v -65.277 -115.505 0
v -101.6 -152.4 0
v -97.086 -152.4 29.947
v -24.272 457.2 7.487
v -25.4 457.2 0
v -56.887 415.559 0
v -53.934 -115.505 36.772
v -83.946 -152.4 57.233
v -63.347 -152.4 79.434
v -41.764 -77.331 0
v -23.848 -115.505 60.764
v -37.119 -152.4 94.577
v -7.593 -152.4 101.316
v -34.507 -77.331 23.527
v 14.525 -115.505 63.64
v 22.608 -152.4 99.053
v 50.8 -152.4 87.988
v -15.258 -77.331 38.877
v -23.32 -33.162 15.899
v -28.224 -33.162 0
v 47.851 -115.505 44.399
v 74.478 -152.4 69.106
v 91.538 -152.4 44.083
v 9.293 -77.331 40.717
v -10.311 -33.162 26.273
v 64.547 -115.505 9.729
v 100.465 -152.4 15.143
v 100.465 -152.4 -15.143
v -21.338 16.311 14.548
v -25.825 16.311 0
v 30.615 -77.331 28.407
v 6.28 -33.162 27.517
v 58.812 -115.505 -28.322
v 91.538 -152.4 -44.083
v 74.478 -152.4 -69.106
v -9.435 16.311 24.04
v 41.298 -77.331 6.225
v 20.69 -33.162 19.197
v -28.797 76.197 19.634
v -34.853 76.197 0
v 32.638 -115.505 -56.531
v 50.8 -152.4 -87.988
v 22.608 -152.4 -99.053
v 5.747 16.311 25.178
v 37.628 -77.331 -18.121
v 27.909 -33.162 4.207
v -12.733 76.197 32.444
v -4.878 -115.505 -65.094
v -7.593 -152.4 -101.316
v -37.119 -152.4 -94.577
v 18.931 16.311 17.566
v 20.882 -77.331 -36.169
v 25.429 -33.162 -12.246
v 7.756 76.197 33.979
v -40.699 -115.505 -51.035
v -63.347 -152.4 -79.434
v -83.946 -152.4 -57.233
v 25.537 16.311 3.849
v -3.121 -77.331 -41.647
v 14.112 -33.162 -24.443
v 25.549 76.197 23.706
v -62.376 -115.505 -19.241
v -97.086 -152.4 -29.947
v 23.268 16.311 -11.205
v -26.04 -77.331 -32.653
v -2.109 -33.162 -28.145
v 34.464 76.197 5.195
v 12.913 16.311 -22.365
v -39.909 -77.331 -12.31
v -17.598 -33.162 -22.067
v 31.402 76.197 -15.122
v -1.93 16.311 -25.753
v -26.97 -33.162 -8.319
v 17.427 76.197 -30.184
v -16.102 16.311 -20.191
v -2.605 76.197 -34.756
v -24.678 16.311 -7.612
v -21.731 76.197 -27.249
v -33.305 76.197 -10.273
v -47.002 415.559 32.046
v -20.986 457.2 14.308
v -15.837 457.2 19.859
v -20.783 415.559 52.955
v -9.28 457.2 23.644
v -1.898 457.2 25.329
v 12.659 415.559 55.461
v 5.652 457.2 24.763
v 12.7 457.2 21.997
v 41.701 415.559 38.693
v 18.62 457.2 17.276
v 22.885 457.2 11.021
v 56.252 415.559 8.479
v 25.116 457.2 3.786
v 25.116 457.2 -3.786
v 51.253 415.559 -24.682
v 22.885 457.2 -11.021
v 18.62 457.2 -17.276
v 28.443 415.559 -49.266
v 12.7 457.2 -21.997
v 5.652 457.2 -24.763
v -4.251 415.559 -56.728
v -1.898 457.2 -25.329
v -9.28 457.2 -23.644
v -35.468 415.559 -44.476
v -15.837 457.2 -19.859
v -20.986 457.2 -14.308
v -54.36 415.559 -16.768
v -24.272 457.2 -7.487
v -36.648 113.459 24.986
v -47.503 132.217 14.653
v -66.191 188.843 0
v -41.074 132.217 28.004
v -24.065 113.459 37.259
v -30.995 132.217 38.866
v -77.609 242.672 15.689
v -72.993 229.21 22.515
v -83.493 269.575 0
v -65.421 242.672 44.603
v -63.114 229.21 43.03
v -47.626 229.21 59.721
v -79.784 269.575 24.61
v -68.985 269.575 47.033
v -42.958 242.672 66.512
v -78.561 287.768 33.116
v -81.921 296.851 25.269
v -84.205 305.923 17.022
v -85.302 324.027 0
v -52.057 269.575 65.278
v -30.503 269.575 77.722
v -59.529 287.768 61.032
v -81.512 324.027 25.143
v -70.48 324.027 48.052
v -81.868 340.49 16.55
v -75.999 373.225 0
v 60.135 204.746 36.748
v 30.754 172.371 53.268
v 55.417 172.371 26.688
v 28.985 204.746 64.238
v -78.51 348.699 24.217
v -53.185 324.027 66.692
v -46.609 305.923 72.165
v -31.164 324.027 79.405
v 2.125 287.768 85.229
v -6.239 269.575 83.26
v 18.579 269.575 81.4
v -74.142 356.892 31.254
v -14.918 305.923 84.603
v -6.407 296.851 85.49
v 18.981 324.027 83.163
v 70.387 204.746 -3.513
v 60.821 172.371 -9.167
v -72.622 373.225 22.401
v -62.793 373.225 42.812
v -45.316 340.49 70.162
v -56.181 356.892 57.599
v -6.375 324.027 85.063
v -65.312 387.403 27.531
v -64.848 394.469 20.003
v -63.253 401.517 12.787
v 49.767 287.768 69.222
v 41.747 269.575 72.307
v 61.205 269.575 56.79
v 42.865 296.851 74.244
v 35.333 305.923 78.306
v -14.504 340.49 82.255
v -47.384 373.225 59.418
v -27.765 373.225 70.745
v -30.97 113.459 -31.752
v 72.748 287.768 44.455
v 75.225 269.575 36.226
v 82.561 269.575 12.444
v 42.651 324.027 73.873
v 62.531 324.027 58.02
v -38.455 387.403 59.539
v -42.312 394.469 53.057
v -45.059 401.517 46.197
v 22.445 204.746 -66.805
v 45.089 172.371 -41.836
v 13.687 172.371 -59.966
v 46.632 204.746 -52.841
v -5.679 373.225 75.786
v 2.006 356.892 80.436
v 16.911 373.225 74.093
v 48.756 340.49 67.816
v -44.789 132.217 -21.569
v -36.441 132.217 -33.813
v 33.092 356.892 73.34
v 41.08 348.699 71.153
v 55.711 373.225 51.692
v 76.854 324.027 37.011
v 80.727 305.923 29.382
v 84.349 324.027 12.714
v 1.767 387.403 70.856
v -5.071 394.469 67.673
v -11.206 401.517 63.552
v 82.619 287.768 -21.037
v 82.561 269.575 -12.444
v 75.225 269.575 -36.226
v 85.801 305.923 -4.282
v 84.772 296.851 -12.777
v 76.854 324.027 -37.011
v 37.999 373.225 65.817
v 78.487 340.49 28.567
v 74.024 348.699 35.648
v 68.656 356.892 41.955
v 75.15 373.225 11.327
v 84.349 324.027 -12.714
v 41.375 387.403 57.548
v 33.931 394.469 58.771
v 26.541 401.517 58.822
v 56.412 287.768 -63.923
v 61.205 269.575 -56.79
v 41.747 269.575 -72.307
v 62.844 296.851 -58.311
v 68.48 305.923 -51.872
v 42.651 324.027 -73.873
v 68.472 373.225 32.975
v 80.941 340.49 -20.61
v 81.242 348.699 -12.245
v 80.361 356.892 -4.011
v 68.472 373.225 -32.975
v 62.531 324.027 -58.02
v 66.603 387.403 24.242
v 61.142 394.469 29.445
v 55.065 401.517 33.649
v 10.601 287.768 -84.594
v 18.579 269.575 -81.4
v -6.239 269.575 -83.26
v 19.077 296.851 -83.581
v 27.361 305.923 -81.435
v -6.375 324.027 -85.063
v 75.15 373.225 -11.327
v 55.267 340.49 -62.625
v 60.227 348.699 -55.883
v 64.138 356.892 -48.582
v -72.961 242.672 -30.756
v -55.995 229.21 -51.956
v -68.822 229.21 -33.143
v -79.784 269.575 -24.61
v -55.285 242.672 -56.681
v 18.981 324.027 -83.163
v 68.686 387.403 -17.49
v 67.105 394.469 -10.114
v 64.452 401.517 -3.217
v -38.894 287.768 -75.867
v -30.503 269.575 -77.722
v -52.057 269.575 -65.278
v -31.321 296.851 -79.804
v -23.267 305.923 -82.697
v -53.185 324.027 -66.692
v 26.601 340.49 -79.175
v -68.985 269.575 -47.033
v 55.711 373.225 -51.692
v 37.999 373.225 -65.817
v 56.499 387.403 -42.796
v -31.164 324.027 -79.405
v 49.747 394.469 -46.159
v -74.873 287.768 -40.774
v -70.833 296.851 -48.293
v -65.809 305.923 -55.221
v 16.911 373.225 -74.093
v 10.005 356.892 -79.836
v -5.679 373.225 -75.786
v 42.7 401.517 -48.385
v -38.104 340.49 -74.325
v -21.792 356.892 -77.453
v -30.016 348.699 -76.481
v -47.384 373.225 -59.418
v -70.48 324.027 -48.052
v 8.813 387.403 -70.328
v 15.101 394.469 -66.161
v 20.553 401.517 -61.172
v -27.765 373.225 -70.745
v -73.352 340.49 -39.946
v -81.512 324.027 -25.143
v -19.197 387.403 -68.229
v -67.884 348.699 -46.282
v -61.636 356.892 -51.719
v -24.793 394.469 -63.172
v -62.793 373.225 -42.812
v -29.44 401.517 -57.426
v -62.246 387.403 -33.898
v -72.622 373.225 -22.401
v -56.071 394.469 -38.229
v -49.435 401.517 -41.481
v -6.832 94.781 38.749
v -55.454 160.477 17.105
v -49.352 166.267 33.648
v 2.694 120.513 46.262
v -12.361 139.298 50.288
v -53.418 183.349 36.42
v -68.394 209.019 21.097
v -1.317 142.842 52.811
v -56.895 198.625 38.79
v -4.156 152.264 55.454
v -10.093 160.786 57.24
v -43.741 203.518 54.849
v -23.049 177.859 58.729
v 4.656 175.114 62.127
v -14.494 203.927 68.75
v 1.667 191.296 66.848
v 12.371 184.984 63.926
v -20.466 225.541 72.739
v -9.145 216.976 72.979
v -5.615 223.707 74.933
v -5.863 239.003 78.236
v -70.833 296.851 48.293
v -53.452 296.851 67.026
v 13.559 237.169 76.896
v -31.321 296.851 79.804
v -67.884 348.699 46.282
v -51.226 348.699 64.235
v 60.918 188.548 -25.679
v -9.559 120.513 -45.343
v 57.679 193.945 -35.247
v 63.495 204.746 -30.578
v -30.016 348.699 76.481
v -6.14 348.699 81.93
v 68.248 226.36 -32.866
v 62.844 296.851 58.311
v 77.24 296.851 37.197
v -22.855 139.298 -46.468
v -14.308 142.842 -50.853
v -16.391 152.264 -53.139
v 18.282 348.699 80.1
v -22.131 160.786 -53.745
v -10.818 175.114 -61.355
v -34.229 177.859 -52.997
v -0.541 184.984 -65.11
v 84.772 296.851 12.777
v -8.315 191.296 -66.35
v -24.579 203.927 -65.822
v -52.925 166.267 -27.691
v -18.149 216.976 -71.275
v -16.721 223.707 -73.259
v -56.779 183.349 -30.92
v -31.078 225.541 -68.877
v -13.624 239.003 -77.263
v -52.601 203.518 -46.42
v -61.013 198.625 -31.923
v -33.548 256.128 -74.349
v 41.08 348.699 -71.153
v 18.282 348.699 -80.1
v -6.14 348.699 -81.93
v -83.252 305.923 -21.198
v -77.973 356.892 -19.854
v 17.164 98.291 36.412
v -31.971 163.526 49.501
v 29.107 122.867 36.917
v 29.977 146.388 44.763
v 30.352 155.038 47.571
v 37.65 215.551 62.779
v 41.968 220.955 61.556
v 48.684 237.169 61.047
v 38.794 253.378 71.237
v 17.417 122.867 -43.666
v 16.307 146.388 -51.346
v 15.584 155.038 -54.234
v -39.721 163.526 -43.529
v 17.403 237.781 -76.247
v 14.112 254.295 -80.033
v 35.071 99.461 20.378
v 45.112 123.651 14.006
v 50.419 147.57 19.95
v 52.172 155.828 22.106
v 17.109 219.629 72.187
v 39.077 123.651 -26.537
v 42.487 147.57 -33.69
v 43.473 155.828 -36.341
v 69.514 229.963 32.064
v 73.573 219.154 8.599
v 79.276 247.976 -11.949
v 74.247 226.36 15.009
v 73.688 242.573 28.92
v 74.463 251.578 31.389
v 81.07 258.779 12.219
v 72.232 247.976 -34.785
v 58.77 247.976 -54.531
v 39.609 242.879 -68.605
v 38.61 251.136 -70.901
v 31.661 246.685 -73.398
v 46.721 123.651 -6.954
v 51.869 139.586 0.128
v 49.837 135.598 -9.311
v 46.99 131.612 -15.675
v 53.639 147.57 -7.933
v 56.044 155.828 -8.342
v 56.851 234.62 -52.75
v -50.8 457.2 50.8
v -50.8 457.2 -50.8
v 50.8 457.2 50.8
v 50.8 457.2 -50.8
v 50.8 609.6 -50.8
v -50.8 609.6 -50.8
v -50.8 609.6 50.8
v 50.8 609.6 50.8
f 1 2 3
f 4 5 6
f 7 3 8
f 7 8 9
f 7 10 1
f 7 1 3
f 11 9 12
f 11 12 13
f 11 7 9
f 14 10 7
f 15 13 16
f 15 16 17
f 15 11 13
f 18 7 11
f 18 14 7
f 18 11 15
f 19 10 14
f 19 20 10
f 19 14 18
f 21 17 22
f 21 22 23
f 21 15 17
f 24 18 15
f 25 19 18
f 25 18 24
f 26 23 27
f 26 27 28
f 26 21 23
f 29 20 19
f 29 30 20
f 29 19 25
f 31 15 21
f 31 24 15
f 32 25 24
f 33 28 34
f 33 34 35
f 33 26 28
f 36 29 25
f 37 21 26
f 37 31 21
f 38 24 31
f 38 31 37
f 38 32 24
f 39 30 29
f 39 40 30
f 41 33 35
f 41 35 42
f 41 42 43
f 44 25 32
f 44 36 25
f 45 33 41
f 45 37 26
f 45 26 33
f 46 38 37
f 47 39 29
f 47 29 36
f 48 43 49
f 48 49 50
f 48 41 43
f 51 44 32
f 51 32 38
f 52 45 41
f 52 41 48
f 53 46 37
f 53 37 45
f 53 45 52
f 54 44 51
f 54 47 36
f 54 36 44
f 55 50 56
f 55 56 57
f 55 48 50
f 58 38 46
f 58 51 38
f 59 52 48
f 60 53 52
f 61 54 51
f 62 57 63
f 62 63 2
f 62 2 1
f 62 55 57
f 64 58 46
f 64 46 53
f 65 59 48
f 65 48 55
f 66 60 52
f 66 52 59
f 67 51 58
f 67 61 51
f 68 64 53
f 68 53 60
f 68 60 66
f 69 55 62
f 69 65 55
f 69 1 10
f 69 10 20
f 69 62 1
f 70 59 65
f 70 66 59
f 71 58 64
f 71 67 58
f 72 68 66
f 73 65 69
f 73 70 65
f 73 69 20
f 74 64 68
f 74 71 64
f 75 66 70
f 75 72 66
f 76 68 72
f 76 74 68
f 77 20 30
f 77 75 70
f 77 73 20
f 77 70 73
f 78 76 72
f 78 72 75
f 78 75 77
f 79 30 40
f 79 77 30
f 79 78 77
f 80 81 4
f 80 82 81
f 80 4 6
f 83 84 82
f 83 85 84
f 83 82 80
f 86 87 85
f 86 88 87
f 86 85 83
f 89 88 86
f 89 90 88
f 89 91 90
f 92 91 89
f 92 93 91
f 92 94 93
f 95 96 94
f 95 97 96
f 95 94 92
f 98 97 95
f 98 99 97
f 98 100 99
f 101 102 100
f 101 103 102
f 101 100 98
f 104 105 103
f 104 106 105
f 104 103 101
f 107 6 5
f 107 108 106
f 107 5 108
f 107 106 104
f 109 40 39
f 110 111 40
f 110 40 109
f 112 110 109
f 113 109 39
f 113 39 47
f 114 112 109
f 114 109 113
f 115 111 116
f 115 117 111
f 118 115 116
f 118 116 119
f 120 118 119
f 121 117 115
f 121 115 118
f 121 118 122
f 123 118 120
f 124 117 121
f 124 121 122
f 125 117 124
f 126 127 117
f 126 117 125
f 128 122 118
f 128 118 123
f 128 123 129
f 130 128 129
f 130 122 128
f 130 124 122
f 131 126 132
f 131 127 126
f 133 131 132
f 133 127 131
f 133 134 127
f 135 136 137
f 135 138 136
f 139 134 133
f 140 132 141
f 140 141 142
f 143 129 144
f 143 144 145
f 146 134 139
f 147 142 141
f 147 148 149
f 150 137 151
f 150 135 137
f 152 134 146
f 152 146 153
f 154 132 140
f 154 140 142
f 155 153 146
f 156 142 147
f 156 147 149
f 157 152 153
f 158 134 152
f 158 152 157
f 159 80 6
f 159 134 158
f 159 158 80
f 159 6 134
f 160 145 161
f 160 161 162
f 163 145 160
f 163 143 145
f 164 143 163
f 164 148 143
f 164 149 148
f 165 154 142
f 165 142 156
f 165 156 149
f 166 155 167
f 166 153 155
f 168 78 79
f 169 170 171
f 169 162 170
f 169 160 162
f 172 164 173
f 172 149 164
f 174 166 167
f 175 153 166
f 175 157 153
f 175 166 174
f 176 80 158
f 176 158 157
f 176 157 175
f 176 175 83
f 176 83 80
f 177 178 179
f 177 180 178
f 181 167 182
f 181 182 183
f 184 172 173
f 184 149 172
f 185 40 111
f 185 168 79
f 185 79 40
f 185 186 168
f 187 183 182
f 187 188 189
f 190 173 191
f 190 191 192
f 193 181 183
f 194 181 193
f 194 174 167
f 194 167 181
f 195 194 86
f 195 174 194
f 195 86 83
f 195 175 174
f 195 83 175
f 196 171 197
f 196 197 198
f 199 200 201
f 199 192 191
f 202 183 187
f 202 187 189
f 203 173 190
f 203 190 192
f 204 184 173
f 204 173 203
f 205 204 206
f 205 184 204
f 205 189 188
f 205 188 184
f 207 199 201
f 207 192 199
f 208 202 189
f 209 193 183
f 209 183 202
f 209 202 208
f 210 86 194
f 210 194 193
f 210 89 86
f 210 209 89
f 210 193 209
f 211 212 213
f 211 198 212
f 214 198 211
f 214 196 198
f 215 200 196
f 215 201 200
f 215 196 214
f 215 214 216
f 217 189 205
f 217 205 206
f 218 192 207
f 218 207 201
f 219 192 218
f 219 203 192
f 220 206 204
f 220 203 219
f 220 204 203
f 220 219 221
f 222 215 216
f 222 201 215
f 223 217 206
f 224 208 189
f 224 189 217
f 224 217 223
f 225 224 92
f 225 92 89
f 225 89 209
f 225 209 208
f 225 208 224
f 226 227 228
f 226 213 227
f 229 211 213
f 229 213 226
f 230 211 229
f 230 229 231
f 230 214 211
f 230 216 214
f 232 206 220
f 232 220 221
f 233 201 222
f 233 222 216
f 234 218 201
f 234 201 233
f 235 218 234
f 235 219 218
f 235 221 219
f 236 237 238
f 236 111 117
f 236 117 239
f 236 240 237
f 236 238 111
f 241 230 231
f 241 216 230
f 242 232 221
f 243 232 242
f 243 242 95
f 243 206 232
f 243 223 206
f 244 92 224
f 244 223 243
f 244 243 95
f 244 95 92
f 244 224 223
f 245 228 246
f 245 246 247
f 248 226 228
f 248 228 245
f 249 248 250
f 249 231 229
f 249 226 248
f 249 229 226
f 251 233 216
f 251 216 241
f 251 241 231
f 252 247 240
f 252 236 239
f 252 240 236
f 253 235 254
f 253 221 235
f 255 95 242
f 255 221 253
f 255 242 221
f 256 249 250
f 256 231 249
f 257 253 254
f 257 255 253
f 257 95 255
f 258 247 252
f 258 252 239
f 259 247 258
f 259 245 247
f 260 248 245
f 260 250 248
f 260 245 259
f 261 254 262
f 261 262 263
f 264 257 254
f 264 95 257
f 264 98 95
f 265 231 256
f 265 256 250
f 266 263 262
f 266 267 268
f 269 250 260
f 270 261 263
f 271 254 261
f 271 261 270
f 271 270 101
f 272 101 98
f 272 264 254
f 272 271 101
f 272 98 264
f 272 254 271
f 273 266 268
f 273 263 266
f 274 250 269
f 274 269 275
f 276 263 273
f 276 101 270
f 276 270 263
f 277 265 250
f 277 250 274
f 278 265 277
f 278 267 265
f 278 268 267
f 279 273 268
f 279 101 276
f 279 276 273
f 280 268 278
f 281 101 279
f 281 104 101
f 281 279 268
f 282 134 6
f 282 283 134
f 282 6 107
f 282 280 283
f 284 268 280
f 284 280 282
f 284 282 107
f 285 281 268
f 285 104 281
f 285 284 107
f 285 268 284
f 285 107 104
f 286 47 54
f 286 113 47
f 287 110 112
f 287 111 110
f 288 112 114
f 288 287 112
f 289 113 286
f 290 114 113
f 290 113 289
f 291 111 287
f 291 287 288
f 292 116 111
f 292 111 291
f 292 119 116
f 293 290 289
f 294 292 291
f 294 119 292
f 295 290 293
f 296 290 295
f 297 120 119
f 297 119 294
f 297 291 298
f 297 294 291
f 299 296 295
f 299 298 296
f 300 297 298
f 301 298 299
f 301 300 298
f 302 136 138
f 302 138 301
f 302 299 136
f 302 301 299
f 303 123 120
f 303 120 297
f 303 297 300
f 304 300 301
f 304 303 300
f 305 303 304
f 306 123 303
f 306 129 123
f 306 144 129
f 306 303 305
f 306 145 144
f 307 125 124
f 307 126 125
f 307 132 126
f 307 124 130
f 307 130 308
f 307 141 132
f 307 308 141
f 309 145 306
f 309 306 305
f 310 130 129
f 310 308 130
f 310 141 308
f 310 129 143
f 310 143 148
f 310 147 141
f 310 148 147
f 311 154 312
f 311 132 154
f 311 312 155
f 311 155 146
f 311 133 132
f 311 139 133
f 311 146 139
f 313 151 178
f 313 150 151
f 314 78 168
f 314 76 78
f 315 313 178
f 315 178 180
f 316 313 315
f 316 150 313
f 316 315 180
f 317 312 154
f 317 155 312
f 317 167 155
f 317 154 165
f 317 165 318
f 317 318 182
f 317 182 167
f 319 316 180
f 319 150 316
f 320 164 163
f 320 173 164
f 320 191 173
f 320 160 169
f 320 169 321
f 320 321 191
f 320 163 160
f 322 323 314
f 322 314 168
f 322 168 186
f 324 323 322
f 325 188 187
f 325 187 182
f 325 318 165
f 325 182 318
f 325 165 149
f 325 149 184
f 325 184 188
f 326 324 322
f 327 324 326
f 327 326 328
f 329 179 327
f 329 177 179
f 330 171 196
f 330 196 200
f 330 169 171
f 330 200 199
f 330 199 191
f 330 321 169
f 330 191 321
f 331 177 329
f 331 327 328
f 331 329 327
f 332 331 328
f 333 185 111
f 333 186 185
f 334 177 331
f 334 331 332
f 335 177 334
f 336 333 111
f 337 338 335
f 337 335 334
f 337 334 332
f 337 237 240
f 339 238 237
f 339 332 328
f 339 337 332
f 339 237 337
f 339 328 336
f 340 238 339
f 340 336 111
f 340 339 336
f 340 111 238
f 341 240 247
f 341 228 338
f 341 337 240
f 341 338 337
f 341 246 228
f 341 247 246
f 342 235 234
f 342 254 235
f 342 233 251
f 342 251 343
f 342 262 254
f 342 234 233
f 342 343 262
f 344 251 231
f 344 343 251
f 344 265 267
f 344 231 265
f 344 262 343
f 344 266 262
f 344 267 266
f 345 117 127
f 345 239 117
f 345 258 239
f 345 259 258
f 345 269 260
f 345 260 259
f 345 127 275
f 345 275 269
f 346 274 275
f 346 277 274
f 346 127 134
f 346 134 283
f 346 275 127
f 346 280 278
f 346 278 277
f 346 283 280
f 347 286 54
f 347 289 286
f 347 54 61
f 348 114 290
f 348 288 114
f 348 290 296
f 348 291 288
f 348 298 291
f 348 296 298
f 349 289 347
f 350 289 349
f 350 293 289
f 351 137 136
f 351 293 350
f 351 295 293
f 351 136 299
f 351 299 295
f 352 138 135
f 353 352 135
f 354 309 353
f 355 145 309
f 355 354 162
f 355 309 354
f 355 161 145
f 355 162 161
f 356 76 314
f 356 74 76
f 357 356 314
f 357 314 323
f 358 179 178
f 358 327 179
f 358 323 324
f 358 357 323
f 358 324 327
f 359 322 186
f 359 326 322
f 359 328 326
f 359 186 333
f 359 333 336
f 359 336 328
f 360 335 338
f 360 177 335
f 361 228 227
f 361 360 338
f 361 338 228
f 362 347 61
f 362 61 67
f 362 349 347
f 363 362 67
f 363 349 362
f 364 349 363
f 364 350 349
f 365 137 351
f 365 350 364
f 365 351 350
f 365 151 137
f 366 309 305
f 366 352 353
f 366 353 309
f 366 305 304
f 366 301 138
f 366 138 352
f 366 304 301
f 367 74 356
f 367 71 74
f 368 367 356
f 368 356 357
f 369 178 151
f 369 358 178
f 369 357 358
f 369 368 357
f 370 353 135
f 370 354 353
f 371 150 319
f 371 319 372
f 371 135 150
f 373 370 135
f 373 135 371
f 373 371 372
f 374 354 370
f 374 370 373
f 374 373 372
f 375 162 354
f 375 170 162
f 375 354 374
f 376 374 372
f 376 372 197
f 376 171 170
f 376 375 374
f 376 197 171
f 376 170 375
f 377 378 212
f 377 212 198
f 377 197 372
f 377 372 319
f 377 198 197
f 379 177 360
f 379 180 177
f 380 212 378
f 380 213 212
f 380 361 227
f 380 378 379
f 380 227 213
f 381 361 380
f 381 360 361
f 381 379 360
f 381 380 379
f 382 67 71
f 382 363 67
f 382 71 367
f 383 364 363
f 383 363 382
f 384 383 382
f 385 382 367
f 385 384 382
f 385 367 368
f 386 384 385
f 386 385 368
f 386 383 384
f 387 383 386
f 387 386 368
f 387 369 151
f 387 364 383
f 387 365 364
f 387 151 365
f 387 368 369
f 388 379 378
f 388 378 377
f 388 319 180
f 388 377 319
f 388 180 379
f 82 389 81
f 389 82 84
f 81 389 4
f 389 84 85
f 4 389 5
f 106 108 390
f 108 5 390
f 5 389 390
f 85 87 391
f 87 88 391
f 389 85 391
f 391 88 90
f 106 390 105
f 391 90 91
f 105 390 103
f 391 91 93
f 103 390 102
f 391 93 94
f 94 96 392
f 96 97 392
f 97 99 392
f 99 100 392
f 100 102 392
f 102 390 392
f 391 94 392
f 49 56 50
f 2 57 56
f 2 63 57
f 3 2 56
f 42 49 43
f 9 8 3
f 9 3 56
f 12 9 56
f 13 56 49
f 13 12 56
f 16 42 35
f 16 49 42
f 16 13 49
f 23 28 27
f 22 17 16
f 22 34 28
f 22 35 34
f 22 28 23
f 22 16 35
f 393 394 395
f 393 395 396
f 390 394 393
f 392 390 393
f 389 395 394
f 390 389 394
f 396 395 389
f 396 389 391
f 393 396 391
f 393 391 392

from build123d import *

# Parameters (mm, degrees)
SKETCH10_W          = 101.6
SKETCH10_H          = 101.6
BOSS_EXTRUDE5_DEPTH = 152.4


with BuildPart() as part:
    # Sketch1 → Revolve3 (revolve)
    with BuildSketch(Plane.XY):
        with BuildLine():
            Line((0, 0), (0, -152.4))
            Line((0, -152.4), (-101.6, -152.4))
            add(Edge.make_bspline(
                [(-101.6, -152.4), (112.233734467, 26.074070803), (-211.807575975, 256.743639399), (-25.4, 457.2)],
                knots=[0, 0, 0, 0, 1, 1, 1, 1], degree=3))
            Line((-25.4, 457.2), (0, 457.2))
            Line((0, 457.2), (0, 0))
        make_face()
    revolve(axis=Axis((0, 0, 0), (0, 1, 0)))

    # Sketch10 → Boss-Extrude5 (add)
    with BuildSketch(Plane(origin=(0, 457.2, 0), x_dir=(1, 0, 0), z_dir=(0, 1, 0))):
        Rectangle(SKETCH10_W, SKETCH10_H)
    extrude(amount=BOSS_EXTRUDE5_DEPTH)


solid = part.part
